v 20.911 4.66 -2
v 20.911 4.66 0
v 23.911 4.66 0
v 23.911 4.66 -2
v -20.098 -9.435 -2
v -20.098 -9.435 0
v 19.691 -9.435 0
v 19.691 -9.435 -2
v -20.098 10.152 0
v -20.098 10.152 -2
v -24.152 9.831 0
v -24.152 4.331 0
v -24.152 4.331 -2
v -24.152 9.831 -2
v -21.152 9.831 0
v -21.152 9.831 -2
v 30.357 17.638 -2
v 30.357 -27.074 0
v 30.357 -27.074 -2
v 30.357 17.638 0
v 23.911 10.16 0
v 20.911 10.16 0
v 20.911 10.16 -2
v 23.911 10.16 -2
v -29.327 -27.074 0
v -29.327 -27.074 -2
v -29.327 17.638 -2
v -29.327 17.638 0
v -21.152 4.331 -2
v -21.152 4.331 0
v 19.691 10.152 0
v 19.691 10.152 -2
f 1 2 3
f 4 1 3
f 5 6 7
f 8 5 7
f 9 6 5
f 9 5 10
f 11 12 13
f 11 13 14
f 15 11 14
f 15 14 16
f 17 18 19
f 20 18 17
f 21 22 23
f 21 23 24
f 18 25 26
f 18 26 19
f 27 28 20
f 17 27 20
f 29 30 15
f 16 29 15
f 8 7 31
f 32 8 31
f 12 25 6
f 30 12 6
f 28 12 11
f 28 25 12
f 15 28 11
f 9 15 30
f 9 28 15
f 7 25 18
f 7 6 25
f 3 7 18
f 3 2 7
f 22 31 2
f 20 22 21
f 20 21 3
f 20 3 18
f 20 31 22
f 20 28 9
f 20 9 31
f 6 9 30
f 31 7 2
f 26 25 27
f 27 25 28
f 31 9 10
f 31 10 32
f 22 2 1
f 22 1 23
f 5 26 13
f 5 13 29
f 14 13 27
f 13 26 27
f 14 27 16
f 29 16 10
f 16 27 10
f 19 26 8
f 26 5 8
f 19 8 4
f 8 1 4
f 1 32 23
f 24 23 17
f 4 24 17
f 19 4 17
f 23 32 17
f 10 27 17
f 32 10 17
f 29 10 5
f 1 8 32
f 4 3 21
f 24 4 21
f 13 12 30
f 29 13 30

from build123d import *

# Parameters (mm, degrees)
F0_W     = 59.68371
F0_H     = 44.711508
F0_W_2   = 50
F0_H_2   = 25.664362
F0_W_3   = 39.789142
F0_H_3   = 19.586922
F0_W_4   = 3
F0_H_4   = 5.5
F1_DEPTH = 2


with BuildPart() as f1:
    # F0 (on Top) → F1 (new body)
    with BuildSketch(Plane.XY):
        with Locations((0.514649, -4.717808)):
            Rectangle(F0_W, F0_H)
        Rectangle(F0_W_2, F0_H_2, mode=Mode.SUBTRACT)
        Rectangle(F0_W_2, F0_H_2)
        with Locations((-0.203197, 0.358383)):
            Rectangle(F0_W_3, F0_H_3, mode=Mode.SUBTRACT)
        with Locations((-22.652147, 7.080561)):
            Rectangle(F0_W_4, F0_H_4, mode=Mode.SUBTRACT)
        with Locations((22.410813, 7.41029)):
            Rectangle(F0_W_4, F0_H_4, mode=Mode.SUBTRACT)
    extrude(amount=-F1_DEPTH)


solid = f1.part
